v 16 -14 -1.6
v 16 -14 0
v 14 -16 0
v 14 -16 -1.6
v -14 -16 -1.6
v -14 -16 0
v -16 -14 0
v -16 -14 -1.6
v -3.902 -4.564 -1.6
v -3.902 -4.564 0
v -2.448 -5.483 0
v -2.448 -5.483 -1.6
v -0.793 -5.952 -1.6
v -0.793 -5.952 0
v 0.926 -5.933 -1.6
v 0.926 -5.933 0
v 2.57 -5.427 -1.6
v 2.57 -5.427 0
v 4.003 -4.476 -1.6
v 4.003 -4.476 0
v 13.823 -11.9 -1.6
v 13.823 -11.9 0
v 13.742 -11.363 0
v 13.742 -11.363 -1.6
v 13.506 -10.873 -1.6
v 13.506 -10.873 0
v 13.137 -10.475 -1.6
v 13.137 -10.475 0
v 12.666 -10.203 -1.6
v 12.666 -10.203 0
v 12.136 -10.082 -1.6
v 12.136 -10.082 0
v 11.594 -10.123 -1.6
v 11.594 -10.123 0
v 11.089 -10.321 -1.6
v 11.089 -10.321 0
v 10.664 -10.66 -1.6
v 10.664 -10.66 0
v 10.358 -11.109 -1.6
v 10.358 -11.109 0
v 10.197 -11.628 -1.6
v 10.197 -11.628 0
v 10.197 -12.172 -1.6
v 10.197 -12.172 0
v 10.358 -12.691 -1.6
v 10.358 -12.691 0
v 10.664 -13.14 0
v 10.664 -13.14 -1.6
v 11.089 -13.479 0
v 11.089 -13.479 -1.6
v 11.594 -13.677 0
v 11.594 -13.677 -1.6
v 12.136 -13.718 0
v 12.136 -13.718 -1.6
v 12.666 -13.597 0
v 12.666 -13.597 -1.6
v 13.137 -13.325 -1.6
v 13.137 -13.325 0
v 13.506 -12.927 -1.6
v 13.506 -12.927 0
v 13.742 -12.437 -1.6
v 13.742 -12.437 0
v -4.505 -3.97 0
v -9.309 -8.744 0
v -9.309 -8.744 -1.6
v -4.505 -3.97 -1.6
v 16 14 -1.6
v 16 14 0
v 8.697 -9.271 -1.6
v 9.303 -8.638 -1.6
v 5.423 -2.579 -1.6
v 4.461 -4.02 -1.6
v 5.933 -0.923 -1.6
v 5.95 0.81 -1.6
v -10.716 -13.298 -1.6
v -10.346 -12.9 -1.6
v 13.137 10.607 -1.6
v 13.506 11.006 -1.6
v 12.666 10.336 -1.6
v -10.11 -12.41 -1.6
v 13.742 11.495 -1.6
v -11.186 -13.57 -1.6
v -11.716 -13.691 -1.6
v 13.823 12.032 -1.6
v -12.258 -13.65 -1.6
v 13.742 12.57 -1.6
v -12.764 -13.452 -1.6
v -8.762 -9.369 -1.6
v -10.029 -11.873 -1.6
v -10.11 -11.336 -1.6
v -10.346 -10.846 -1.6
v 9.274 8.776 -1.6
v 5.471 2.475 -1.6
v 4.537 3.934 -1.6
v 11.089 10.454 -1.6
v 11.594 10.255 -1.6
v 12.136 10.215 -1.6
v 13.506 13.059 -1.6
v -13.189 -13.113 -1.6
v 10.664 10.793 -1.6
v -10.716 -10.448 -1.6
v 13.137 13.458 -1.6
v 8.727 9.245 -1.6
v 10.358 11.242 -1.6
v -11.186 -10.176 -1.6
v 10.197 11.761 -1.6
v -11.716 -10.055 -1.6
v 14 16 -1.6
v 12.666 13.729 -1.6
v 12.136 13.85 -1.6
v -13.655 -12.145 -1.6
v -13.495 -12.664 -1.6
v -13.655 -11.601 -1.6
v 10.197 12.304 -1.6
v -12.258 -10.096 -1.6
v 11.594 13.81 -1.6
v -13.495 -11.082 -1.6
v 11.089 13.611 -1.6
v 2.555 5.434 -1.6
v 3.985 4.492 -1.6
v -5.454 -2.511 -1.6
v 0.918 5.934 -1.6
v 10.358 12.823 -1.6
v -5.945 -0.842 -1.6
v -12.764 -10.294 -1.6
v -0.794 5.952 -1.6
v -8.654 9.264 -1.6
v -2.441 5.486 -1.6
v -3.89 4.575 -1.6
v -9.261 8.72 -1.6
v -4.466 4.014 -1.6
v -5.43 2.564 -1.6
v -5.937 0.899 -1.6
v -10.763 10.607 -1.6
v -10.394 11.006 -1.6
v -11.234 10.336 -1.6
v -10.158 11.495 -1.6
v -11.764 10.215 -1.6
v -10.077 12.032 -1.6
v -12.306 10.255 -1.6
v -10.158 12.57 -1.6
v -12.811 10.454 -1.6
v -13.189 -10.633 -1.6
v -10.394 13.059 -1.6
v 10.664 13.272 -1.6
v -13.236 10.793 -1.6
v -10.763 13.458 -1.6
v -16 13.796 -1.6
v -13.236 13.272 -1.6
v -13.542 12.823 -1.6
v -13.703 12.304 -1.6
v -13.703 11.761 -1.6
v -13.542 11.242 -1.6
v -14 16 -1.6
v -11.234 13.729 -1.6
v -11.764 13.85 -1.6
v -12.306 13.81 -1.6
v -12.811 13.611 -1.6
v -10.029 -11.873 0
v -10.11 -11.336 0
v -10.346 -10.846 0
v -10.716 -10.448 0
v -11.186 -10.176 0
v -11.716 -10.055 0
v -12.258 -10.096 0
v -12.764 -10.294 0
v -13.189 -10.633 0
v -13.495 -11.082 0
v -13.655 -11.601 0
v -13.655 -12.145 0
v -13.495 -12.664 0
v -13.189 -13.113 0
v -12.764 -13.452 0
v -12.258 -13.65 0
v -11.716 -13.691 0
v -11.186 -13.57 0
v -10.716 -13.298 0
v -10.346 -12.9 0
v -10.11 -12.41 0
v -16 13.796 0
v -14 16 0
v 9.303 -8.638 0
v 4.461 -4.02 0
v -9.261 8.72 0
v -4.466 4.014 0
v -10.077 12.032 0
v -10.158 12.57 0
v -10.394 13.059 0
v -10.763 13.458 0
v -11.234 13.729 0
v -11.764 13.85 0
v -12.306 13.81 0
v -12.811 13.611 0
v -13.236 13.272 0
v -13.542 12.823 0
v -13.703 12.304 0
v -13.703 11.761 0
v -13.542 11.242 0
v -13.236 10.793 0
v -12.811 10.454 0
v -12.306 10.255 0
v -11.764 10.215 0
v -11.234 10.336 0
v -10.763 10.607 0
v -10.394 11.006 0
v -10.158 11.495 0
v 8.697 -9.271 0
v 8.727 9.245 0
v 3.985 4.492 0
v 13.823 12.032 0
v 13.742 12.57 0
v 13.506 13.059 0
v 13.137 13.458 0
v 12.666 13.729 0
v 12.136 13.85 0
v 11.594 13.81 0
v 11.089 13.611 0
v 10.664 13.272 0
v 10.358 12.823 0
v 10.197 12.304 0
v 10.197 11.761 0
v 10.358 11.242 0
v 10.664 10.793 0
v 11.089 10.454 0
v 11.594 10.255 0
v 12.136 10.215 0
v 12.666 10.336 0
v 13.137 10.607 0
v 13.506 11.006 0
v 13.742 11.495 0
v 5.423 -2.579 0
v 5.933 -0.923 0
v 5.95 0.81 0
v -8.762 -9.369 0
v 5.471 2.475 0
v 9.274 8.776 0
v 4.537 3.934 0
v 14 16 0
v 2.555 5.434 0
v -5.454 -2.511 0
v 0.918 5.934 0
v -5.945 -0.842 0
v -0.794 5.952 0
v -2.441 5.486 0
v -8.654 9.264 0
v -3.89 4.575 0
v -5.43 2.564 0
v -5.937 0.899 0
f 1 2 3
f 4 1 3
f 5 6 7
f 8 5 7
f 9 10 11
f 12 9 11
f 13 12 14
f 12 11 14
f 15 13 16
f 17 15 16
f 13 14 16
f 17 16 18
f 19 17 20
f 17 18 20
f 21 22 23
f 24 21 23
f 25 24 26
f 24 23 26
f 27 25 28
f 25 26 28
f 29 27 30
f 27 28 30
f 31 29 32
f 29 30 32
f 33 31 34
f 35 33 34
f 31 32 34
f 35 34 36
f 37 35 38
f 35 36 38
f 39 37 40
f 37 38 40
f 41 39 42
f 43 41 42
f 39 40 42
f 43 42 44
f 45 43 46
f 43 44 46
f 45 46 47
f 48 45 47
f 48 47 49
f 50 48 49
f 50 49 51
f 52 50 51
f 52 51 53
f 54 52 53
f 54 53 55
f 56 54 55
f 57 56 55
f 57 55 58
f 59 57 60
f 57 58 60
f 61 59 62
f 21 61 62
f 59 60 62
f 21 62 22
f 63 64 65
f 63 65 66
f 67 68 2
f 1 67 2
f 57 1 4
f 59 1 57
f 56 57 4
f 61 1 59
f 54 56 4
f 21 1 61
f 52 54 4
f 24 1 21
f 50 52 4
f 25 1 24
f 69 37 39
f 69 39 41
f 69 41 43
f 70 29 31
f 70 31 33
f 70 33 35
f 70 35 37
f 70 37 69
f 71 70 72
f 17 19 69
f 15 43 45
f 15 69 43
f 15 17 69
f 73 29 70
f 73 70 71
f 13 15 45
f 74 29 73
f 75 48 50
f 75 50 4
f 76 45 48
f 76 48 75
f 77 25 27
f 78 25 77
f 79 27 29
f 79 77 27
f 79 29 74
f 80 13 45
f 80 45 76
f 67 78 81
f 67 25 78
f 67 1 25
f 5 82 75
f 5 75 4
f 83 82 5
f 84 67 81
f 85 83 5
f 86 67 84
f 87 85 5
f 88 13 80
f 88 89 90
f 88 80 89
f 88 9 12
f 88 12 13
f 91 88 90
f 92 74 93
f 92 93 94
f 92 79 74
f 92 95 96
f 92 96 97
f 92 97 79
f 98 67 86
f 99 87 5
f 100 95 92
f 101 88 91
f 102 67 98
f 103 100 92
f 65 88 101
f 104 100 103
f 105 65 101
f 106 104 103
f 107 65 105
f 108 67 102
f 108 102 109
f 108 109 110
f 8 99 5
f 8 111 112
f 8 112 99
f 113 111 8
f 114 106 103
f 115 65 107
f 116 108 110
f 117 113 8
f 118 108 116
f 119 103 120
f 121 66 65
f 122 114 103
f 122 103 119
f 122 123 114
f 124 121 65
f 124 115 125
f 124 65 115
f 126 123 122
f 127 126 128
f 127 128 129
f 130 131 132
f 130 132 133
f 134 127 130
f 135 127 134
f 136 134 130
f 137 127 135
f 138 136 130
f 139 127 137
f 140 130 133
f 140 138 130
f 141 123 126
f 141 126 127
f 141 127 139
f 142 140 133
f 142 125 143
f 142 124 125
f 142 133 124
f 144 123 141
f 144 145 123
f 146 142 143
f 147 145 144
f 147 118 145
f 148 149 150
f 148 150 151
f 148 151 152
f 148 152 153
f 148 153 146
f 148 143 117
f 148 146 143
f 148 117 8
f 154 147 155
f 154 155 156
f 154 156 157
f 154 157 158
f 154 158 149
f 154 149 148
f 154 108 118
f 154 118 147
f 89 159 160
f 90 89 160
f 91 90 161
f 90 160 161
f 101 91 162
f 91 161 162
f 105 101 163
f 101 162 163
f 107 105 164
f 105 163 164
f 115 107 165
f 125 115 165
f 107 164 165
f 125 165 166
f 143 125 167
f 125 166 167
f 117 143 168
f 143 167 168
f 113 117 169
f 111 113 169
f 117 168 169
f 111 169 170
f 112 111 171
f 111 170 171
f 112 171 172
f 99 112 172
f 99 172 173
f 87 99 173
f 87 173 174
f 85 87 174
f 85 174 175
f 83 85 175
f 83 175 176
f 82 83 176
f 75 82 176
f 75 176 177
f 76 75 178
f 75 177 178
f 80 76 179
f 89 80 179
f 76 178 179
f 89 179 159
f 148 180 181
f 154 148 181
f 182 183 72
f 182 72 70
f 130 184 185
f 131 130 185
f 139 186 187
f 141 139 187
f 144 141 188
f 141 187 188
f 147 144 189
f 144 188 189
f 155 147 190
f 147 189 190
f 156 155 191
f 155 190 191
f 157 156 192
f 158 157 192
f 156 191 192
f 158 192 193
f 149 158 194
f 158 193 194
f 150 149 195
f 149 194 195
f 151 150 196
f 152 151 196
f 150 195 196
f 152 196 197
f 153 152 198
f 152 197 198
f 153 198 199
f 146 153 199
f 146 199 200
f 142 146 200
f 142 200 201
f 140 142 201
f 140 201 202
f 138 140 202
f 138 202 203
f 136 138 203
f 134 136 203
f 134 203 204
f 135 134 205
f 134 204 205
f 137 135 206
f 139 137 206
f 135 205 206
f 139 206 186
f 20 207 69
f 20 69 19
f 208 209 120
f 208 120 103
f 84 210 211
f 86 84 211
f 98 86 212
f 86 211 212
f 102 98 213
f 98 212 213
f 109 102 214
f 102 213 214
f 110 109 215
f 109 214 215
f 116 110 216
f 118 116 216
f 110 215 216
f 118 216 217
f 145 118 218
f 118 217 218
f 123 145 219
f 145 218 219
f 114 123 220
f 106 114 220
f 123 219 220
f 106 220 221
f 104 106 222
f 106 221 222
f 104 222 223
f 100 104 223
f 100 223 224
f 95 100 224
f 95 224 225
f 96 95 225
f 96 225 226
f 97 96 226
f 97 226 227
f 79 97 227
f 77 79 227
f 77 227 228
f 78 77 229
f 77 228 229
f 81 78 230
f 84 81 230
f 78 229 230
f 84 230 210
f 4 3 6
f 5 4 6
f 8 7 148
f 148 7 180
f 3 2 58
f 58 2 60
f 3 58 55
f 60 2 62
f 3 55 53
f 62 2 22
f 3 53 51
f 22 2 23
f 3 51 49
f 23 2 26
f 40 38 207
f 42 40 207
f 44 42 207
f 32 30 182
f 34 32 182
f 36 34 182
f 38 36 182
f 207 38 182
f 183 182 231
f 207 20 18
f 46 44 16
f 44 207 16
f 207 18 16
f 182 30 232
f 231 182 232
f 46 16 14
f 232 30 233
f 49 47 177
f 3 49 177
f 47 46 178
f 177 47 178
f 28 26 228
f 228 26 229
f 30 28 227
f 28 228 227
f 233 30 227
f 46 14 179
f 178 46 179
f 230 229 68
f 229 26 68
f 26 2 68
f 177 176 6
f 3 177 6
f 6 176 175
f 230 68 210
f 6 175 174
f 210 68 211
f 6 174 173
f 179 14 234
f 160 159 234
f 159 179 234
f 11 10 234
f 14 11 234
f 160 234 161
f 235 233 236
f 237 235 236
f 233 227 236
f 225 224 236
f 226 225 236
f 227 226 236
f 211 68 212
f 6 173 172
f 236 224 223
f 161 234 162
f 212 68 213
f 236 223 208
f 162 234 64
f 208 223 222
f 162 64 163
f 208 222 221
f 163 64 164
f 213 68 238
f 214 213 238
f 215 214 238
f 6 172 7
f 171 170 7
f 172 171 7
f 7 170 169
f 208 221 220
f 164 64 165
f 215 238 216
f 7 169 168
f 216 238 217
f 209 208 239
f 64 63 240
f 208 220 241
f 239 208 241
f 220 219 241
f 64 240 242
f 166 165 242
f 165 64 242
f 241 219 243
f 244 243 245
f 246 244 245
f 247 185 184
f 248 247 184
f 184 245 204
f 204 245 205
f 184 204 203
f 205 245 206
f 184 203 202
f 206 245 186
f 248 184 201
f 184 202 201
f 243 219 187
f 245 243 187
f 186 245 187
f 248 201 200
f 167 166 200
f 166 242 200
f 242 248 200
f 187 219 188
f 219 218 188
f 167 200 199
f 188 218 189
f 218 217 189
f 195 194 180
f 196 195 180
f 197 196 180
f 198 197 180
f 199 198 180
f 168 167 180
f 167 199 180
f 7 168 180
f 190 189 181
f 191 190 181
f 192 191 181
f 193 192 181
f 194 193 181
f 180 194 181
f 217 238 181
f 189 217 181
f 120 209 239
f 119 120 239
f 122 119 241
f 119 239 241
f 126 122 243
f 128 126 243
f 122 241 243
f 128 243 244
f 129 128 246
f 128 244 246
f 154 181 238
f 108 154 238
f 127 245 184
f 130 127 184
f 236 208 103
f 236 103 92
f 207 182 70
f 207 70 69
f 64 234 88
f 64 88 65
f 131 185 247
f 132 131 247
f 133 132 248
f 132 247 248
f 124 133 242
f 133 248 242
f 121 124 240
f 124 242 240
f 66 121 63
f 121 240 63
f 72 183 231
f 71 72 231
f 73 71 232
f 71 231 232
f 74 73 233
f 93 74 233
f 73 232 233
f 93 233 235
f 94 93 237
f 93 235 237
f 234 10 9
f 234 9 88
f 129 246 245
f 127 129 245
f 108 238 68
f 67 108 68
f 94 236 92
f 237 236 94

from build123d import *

# Parameters (mm, degrees)
SKETCH_R  = 1.822871
PAD_DEPTH = 1.6


with BuildPart() as part:
    # Sketch → Pad (new body)
    with BuildSketch(Plane.XY):
        Polygon((14, 16), (16, 14), (16, -14), (14, -16), (-14, -16), (-16, -14), (-16, 13.796185), (-14, 16), align=None)
        with Locations((-11.9, 12.032497)):
            Circle(SKETCH_R, mode=Mode.SUBTRACT)
        with Locations((12, 12.032497)):
            Circle(SKETCH_R, mode=Mode.SUBTRACT)
        with Locations((-11.852346, -11.872872)):
            Circle(SKETCH_R, mode=Mode.SUBTRACT)
        with Locations((12, -11.9)):
            Circle(SKETCH_R, mode=Mode.SUBTRACT)
        with BuildLine():
            ThreePointArc((3.984503, 4.492219), (0.062772, 6.004362), (-3.889715, 4.57454))
            Line((-3.889715, 4.57454), (-8.654236, 9.264053))
            Line((-8.654236, 9.264053), (-9.260711, 8.720268))
            Line((-9.260711, 8.720268), (-4.466236, 4.013607))
            ThreePointArc((-4.466236, 4.013607), (-6.00462, 0.029046), (-4.504856, -3.970211))
            Line((-9.309208, -8.743832), (-4.504856, -3.970211))
            Line((-8.762374, -9.368784), (-9.309208, -8.743832))
            Line((-3.901652, -4.564363), (-8.762374, -9.368784))
            ThreePointArc((-3.901652, -4.564363), (0.06724, -6.004314), (4.00289, -4.475843))
            Line((8.697231, -9.271135), (4.00289, -4.475843))
            Line((9.302653, -8.638371), (8.697231, -9.271135))
            Line((4.46051, -4.019969), (9.302653, -8.638371))
            ThreePointArc((4.46051, -4.019969), (6.004416, -0.057401), (4.536548, 3.933959))
            Line((9.274082, 8.77581), (4.536548, 3.933959))
            Line((8.727249, 9.244524), (9.274082, 8.77581))
            Line((3.984503, 4.492219), (8.727249, 9.244524))
        make_face(mode=Mode.SUBTRACT)
    extrude(amount=-PAD_DEPTH)


solid = part.part
